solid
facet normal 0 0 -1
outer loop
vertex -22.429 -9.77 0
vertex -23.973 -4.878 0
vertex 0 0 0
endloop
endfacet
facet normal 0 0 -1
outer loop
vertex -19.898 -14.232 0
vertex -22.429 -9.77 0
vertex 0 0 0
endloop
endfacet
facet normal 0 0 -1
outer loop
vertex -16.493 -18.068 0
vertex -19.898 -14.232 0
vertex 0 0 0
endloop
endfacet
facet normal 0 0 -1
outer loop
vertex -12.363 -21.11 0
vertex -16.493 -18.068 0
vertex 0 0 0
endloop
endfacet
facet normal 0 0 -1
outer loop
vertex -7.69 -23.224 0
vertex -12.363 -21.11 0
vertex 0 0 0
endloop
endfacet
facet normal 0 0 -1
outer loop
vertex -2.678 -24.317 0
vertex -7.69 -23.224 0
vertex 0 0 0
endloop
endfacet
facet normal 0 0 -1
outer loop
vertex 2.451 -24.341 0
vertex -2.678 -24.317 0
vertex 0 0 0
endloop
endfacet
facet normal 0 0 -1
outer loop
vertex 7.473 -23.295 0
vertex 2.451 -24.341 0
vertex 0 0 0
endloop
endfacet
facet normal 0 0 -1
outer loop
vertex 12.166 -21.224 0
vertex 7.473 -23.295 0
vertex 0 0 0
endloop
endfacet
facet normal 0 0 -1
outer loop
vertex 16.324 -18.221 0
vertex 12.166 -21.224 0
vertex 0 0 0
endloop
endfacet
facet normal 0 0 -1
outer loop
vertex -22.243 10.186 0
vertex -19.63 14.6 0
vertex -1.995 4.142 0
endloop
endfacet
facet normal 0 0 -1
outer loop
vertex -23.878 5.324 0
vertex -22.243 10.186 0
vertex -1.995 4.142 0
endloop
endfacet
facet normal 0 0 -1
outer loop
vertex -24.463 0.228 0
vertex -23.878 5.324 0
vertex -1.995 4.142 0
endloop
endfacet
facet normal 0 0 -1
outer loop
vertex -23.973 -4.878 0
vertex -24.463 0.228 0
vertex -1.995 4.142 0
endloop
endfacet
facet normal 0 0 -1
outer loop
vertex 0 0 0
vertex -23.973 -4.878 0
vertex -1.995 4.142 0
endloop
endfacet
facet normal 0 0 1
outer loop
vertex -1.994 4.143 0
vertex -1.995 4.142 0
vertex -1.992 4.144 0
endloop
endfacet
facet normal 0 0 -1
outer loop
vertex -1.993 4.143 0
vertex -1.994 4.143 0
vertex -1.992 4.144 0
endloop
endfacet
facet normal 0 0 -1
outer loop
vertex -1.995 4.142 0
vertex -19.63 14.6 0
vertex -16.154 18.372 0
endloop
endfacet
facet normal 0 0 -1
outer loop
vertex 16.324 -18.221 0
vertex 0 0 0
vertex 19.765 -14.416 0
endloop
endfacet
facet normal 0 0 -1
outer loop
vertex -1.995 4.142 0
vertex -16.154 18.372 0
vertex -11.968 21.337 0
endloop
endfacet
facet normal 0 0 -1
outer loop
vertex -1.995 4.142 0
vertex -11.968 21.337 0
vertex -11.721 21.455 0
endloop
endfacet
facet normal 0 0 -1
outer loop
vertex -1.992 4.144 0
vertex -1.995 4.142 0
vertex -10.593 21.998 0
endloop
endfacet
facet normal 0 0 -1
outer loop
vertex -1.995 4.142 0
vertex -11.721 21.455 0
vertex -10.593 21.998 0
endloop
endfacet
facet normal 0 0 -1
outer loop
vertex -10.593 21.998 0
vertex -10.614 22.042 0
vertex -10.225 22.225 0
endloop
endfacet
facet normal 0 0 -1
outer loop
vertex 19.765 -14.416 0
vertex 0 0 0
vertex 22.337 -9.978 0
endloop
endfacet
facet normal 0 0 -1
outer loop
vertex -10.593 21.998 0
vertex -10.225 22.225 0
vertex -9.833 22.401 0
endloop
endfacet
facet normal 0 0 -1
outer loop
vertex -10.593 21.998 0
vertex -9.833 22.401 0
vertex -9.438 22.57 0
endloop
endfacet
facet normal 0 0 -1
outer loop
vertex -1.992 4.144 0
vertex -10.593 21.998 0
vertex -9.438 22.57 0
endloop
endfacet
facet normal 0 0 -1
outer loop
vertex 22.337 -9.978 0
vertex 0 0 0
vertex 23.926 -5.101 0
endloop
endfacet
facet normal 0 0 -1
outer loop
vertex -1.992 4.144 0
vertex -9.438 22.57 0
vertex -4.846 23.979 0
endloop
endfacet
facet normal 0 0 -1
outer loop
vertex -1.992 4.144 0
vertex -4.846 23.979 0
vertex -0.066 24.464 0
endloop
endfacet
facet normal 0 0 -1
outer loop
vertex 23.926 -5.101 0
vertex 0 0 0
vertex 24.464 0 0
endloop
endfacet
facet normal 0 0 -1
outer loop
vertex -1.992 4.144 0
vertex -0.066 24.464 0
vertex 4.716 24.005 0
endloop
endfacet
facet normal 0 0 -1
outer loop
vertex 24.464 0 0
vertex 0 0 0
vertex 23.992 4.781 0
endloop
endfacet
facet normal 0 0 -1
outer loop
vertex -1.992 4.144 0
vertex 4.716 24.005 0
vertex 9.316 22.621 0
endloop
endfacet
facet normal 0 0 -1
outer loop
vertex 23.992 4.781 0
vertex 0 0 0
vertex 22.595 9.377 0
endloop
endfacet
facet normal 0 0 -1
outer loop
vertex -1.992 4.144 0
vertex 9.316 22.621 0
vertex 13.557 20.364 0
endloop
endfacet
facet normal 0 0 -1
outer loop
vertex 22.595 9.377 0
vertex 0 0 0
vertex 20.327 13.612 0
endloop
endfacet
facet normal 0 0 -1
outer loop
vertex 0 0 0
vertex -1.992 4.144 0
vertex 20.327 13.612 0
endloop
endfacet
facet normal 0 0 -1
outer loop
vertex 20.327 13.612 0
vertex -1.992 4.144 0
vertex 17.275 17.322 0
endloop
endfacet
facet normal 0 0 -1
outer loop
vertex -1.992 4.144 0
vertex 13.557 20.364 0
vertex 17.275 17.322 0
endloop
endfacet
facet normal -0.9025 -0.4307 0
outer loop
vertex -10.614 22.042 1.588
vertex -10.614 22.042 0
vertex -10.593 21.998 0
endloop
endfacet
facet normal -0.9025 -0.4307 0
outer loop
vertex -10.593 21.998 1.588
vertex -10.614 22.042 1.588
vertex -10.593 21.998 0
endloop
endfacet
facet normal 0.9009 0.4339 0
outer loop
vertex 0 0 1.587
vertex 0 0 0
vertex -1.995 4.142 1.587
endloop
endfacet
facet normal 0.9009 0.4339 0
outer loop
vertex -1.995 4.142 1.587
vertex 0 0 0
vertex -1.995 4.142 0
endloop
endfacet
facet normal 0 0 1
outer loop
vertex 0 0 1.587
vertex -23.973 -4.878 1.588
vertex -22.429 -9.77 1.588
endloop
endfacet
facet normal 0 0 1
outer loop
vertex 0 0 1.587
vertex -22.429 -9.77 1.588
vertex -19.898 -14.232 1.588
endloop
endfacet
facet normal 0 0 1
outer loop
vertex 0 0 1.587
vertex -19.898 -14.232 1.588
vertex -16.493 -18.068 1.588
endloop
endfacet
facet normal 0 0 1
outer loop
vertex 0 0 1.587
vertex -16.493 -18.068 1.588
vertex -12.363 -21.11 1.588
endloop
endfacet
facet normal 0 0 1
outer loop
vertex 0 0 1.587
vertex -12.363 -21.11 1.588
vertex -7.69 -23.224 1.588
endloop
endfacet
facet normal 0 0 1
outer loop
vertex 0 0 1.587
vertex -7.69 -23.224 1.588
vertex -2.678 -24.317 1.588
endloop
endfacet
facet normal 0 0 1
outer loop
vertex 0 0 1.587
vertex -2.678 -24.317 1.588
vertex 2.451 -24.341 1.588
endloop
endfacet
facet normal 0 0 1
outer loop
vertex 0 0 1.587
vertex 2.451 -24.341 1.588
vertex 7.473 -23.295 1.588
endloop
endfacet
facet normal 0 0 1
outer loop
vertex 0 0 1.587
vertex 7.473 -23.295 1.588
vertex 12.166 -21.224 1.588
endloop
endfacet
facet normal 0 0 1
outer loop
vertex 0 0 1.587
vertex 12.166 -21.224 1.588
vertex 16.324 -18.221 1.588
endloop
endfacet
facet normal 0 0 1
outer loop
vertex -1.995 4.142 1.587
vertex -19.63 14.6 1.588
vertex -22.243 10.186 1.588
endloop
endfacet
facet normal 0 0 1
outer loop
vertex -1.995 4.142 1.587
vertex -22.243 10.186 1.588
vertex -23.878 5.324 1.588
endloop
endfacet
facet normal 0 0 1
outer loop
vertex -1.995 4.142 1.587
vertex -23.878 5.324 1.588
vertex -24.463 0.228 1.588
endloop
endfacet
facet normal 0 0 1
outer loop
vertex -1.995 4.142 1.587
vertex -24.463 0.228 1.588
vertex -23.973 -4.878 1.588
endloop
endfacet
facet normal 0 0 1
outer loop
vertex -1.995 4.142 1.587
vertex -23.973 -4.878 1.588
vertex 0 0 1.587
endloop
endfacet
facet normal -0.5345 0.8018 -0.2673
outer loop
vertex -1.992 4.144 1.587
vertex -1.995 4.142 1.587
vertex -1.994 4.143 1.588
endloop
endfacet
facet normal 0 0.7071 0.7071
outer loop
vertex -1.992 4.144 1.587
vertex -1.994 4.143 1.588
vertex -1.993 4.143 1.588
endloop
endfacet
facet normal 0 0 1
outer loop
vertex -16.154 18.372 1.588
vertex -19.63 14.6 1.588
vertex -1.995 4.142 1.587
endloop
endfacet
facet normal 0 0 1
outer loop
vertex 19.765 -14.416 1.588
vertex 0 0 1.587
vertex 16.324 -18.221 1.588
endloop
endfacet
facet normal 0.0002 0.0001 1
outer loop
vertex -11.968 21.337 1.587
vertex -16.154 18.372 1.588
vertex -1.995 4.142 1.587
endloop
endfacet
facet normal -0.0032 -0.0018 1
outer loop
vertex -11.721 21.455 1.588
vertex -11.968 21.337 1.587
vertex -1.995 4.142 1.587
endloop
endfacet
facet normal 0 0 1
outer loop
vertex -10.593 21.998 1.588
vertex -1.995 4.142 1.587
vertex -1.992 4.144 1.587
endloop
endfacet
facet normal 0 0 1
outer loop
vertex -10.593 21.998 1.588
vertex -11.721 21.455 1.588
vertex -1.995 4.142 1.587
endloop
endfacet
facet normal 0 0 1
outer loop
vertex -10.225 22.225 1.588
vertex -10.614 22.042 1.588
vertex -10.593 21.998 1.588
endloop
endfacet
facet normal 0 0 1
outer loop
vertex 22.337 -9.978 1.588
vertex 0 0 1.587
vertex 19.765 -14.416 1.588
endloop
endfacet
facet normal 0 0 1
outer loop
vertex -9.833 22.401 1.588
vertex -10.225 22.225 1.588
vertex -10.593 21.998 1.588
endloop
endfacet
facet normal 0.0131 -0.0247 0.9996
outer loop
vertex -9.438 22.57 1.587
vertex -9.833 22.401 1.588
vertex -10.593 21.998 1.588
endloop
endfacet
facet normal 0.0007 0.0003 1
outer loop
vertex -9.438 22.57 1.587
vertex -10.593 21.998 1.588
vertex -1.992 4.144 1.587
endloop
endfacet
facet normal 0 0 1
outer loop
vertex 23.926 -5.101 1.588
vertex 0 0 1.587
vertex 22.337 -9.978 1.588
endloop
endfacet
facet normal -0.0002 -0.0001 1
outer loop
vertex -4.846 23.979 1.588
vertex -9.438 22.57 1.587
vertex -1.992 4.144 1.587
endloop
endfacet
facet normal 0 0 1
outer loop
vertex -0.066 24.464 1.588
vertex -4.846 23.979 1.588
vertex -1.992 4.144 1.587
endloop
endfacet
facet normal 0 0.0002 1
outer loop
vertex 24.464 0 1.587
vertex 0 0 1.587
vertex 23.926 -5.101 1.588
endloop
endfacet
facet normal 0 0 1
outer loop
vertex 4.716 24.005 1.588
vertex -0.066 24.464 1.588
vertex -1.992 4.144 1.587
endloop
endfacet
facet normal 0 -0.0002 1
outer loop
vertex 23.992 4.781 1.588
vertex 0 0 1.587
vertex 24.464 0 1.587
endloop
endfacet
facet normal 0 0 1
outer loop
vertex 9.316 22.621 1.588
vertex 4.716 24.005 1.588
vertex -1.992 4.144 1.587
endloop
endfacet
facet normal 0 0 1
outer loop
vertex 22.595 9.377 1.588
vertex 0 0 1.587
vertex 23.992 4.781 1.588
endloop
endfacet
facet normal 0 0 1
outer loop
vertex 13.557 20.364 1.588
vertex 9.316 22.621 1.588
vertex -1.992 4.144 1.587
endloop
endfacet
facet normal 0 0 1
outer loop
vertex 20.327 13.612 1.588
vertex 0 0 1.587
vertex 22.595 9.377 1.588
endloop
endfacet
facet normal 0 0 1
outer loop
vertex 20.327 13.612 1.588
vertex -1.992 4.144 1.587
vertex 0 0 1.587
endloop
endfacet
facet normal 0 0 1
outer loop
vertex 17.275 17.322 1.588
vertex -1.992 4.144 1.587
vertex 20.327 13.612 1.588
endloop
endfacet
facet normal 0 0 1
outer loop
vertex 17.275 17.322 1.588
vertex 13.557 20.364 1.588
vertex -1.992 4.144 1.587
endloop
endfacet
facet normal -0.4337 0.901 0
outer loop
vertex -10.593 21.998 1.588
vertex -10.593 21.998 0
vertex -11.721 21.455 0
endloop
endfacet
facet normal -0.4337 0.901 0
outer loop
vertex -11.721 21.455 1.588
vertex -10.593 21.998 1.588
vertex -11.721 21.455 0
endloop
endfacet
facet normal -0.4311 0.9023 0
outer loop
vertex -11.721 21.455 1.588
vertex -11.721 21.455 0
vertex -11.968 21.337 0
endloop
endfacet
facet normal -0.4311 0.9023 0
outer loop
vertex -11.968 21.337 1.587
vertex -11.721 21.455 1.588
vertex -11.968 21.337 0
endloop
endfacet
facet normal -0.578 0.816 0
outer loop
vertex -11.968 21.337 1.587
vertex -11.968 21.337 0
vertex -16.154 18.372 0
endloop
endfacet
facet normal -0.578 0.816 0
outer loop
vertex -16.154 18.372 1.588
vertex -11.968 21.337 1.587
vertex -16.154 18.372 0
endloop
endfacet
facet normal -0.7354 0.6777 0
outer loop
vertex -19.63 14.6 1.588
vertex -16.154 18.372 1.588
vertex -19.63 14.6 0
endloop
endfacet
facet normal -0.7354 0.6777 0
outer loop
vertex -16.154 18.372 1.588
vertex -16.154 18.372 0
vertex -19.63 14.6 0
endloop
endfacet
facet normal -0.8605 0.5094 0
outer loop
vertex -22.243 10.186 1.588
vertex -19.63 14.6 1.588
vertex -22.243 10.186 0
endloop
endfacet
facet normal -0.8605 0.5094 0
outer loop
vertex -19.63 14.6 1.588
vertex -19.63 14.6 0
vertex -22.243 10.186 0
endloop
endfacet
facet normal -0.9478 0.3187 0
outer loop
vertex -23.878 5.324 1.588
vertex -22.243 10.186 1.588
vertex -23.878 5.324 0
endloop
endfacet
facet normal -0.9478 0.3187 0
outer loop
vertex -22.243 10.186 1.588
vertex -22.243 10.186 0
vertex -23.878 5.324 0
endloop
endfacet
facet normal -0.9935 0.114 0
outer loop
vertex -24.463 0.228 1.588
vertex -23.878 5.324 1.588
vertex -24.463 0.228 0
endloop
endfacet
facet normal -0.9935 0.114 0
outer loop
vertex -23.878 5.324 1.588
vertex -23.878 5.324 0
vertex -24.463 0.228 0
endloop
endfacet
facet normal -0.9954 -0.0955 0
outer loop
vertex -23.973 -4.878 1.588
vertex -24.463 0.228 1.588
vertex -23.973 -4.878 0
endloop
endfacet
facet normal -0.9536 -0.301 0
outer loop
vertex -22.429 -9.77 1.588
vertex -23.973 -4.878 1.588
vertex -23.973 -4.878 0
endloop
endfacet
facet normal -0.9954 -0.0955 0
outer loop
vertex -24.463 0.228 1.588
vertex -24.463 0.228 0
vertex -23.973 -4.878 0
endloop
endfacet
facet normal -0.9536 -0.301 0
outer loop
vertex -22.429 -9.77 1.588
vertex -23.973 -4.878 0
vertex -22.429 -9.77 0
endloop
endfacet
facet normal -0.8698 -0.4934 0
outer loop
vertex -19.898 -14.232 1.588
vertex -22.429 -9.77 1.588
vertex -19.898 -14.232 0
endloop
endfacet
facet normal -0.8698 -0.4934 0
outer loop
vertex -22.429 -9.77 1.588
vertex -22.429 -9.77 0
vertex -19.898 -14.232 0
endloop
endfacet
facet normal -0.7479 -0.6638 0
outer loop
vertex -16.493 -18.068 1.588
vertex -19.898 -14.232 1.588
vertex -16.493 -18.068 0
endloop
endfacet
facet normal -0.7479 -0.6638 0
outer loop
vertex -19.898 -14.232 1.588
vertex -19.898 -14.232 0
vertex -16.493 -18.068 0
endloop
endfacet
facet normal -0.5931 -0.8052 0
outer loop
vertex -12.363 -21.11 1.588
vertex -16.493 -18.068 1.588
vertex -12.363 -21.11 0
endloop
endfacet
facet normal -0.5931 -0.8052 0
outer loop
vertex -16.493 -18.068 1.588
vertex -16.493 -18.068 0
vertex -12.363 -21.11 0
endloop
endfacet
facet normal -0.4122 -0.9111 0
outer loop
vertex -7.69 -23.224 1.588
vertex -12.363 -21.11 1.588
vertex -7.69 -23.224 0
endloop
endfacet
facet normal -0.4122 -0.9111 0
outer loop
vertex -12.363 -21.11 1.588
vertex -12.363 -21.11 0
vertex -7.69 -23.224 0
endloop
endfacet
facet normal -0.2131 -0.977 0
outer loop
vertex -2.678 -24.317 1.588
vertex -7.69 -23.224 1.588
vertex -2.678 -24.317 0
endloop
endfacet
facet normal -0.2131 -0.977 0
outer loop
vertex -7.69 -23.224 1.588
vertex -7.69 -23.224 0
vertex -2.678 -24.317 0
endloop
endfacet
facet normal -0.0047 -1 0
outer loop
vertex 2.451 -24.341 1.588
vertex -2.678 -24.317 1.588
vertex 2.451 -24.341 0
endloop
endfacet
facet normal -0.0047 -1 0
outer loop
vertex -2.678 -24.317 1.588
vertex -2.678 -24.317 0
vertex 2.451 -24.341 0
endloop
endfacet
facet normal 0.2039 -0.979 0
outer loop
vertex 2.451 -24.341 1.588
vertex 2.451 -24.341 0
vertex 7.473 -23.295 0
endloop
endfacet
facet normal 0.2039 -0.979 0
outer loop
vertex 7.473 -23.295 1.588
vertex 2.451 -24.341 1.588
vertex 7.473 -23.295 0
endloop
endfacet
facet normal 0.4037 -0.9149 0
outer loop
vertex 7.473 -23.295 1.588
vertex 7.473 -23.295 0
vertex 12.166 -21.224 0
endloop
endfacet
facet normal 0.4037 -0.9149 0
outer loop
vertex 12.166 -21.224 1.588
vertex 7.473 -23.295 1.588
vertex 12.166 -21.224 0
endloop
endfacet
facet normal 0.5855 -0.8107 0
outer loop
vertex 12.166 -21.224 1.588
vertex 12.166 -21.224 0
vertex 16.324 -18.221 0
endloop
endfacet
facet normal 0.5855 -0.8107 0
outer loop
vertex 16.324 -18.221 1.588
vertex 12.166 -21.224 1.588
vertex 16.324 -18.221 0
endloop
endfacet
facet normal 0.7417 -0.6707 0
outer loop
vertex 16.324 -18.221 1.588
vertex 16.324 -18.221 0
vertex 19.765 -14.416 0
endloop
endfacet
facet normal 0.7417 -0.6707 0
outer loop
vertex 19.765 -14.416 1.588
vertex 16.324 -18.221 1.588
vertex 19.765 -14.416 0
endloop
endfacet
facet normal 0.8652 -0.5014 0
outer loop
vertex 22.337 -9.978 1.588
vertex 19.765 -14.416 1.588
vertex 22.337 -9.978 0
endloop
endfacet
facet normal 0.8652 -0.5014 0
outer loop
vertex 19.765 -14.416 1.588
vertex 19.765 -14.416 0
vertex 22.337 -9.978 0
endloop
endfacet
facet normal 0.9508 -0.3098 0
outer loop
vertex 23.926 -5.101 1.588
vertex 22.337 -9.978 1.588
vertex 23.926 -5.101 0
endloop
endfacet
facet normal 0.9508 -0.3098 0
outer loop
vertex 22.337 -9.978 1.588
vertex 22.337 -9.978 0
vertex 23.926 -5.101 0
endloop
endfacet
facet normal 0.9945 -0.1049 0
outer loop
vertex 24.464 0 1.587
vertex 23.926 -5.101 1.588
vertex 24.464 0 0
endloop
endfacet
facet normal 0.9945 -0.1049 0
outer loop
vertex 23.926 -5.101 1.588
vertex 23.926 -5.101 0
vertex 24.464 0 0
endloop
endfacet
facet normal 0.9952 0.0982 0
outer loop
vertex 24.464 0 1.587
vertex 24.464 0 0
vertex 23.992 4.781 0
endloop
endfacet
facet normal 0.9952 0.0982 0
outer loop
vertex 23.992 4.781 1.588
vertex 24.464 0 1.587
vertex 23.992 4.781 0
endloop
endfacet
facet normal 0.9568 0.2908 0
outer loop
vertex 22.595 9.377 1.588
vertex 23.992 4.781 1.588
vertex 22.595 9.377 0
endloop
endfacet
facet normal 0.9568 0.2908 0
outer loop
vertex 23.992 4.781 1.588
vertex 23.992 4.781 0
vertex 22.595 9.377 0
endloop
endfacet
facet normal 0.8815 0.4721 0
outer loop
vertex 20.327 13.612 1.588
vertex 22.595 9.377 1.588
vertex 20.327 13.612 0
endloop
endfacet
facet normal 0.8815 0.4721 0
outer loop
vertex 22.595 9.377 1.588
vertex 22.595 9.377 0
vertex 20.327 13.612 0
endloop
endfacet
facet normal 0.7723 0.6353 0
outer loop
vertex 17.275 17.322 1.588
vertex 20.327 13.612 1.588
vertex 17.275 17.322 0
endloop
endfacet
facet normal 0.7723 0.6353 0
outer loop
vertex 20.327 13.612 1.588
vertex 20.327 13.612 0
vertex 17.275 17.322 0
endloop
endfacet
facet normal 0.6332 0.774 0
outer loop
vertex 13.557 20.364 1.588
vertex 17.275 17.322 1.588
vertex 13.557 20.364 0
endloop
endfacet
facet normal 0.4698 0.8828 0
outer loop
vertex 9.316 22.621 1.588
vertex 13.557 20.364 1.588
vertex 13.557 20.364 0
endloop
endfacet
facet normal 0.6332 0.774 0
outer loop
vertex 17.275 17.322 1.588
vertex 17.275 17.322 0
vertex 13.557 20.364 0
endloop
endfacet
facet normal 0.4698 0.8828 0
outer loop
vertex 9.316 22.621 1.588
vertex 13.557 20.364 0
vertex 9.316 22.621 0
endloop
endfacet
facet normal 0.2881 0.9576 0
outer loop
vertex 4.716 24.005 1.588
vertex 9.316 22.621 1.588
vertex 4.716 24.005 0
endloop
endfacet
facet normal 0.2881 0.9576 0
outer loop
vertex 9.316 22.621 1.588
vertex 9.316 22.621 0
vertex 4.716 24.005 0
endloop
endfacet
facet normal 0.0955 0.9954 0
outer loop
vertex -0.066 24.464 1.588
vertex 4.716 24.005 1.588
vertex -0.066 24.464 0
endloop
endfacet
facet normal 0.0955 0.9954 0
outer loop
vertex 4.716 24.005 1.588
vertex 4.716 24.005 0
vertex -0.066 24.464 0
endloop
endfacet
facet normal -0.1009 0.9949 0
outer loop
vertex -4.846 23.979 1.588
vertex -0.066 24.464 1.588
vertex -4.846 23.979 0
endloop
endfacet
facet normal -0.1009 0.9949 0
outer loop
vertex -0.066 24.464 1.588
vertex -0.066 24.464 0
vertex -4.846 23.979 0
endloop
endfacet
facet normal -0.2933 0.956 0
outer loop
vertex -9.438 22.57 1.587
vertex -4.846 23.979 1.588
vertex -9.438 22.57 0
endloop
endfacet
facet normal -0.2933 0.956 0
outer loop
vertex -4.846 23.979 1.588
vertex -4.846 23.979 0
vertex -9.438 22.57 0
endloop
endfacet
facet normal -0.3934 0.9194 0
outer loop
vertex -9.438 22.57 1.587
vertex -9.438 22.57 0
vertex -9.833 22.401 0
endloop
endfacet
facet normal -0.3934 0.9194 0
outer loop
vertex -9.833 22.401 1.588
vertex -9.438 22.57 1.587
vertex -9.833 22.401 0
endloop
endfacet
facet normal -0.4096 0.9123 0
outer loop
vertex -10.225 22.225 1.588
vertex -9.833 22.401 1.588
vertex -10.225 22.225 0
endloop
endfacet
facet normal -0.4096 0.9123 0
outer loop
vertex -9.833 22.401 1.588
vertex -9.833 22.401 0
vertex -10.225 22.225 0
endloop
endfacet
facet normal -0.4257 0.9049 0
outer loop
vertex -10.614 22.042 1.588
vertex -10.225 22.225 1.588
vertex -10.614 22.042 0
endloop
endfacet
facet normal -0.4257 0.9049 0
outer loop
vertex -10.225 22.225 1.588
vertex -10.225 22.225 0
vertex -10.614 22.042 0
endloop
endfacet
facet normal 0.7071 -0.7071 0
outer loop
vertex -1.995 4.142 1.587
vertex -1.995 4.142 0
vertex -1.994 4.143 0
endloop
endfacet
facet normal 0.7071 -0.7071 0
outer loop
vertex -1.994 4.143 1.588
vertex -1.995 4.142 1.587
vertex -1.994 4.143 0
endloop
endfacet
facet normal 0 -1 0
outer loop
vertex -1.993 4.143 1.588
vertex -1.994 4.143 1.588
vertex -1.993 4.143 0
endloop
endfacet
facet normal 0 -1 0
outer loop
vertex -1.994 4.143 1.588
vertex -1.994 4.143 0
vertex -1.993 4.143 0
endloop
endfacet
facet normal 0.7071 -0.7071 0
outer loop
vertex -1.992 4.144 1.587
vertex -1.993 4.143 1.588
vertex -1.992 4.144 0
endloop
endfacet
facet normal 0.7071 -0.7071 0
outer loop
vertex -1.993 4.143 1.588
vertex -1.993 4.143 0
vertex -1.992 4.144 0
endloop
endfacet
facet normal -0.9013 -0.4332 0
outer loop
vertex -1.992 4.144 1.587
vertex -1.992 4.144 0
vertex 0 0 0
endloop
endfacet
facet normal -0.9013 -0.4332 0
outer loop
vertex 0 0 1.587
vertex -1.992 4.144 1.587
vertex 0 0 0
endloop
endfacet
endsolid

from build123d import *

# Parameters (mm, degrees)
F1_DEPTH = 1.5875
F2_DEPTH = 1.5875
F3_DEPTH = 1.5875


with BuildPart() as f1:
    # F0 (on Top) → F1 (new body)
    with BuildSketch(Plane.XY):
        with BuildLine():
            ThreePointArc((-1.994726, 4.142371), (-10.83638, 1.048738), (-20.14474, 0))
            ThreePointArc((-20.14474, 0), (8.739997, -18.150014), (12.560869, 15.749131))
            ThreePointArc((12.560869, 15.749131), (5.938271, 9.126868), (-1.991606, 4.143874))
            Line((-1.991606, 4.143874), (0, 0))
            Line((0, 0), (-1.994726, 4.142371))
        make_face()
    extrude(amount=F1_DEPTH)



with BuildPart() as f2:
    # F0 (on Top) → F2 (new body)
    with BuildSketch(Plane.XY):
        with BuildLine():
            Line((-11.720869, 21.455461), (-11.967893, 21.336738))
            ThreePointArc((-11.967893, 21.336738), (-12.363341, -21.11006), (24.463991, 0))
            ThreePointArc((24.463991, 0), (13.556989, 20.364059), (-9.438483, 22.569933))
            ThreePointArc((-9.438483, 22.569933), (-9.339647, 22.295321), (-9.306112, 22.005397))
            ThreePointArc((-9.306112, 22.005397), (-10.294103, 20.767103), (-11.720869, 21.455461))
        make_face()
        with BuildLine():
            ThreePointArc((12.560869, 15.749131), (8.739997, -18.150014), (-20.14474, 0))
            ThreePointArc((-20.14474, 0), (-10.83638, 1.048738), (-1.994726, 4.142371))
            ThreePointArc((-1.994726, 4.142371), (-1.993166, 4.143122), (-1.991606, 4.143874))
            ThreePointArc((-1.991606, 4.143874), (5.938271, 9.126868), (12.560869, 15.749131))
        make_face(mode=Mode.SUBTRACT)
    extrude(amount=F2_DEPTH)


with BuildPart() as f1_1:
    add(f1.part)

    add(f2.part)  # F3 merges F2
    # F0 (on Top) → F3 (join)
    with BuildSketch(Plane.XY):
        with BuildLine():
            Line((-11.720869, 21.455461), (-11.967893, 21.336738))
            ThreePointArc((-11.967893, 21.336738), (-12.363341, -21.11006), (24.463991, 0))
            ThreePointArc((24.463991, 0), (13.556989, 20.364059), (-9.438483, 22.569933))
            ThreePointArc((-9.438483, 22.569933), (-9.339647, 22.295321), (-9.306112, 22.005397))
            ThreePointArc((-9.306112, 22.005397), (-10.294103, 20.767103), (-11.720869, 21.455461))
        make_face()
        with BuildLine():
            ThreePointArc((12.560869, 15.749131), (8.739997, -18.150014), (-20.14474, 0))
            ThreePointArc((-20.14474, 0), (-10.83638, 1.048738), (-1.994726, 4.142371))
            ThreePointArc((-1.994726, 4.142371), (-1.993166, 4.143122), (-1.991606, 4.143874))
            ThreePointArc((-1.991606, 4.143874), (5.938271, 9.126868), (12.560869, 15.749131))
        make_face(mode=Mode.SUBTRACT)
        with BuildLine():
            ThreePointArc((-1.994726, 4.142371), (-10.83638, 1.048738), (-20.14474, 0))
            ThreePointArc((-20.14474, 0), (8.739997, -18.150014), (12.560869, 15.749131))
            ThreePointArc((12.560869, 15.749131), (5.938271, 9.126868), (-1.991606, 4.143874))
            Line((-1.991606, 4.143874), (0, 0))
            Line((0, 0), (-1.994726, 4.142371))
        make_face()
        with BuildLine():
            Line((-10.592788, 21.997633), (-11.720869, 21.455461))
            ThreePointArc((-11.720869, 21.455461), (-10.294103, 20.767103), (-9.306112, 22.005397))
            ThreePointArc((-9.306112, 22.005397), (-9.339647, 22.295321), (-9.438483, 22.569933))
            ThreePointArc((-9.438483, 22.569933), (-10.029695, 22.313495), (-10.613948, 22.041573))
            Line((-10.613948, 22.041573), (-10.592788, 21.997633))
        make_face()
    extrude(amount=F3_DEPTH)


solid = f1_1.part
